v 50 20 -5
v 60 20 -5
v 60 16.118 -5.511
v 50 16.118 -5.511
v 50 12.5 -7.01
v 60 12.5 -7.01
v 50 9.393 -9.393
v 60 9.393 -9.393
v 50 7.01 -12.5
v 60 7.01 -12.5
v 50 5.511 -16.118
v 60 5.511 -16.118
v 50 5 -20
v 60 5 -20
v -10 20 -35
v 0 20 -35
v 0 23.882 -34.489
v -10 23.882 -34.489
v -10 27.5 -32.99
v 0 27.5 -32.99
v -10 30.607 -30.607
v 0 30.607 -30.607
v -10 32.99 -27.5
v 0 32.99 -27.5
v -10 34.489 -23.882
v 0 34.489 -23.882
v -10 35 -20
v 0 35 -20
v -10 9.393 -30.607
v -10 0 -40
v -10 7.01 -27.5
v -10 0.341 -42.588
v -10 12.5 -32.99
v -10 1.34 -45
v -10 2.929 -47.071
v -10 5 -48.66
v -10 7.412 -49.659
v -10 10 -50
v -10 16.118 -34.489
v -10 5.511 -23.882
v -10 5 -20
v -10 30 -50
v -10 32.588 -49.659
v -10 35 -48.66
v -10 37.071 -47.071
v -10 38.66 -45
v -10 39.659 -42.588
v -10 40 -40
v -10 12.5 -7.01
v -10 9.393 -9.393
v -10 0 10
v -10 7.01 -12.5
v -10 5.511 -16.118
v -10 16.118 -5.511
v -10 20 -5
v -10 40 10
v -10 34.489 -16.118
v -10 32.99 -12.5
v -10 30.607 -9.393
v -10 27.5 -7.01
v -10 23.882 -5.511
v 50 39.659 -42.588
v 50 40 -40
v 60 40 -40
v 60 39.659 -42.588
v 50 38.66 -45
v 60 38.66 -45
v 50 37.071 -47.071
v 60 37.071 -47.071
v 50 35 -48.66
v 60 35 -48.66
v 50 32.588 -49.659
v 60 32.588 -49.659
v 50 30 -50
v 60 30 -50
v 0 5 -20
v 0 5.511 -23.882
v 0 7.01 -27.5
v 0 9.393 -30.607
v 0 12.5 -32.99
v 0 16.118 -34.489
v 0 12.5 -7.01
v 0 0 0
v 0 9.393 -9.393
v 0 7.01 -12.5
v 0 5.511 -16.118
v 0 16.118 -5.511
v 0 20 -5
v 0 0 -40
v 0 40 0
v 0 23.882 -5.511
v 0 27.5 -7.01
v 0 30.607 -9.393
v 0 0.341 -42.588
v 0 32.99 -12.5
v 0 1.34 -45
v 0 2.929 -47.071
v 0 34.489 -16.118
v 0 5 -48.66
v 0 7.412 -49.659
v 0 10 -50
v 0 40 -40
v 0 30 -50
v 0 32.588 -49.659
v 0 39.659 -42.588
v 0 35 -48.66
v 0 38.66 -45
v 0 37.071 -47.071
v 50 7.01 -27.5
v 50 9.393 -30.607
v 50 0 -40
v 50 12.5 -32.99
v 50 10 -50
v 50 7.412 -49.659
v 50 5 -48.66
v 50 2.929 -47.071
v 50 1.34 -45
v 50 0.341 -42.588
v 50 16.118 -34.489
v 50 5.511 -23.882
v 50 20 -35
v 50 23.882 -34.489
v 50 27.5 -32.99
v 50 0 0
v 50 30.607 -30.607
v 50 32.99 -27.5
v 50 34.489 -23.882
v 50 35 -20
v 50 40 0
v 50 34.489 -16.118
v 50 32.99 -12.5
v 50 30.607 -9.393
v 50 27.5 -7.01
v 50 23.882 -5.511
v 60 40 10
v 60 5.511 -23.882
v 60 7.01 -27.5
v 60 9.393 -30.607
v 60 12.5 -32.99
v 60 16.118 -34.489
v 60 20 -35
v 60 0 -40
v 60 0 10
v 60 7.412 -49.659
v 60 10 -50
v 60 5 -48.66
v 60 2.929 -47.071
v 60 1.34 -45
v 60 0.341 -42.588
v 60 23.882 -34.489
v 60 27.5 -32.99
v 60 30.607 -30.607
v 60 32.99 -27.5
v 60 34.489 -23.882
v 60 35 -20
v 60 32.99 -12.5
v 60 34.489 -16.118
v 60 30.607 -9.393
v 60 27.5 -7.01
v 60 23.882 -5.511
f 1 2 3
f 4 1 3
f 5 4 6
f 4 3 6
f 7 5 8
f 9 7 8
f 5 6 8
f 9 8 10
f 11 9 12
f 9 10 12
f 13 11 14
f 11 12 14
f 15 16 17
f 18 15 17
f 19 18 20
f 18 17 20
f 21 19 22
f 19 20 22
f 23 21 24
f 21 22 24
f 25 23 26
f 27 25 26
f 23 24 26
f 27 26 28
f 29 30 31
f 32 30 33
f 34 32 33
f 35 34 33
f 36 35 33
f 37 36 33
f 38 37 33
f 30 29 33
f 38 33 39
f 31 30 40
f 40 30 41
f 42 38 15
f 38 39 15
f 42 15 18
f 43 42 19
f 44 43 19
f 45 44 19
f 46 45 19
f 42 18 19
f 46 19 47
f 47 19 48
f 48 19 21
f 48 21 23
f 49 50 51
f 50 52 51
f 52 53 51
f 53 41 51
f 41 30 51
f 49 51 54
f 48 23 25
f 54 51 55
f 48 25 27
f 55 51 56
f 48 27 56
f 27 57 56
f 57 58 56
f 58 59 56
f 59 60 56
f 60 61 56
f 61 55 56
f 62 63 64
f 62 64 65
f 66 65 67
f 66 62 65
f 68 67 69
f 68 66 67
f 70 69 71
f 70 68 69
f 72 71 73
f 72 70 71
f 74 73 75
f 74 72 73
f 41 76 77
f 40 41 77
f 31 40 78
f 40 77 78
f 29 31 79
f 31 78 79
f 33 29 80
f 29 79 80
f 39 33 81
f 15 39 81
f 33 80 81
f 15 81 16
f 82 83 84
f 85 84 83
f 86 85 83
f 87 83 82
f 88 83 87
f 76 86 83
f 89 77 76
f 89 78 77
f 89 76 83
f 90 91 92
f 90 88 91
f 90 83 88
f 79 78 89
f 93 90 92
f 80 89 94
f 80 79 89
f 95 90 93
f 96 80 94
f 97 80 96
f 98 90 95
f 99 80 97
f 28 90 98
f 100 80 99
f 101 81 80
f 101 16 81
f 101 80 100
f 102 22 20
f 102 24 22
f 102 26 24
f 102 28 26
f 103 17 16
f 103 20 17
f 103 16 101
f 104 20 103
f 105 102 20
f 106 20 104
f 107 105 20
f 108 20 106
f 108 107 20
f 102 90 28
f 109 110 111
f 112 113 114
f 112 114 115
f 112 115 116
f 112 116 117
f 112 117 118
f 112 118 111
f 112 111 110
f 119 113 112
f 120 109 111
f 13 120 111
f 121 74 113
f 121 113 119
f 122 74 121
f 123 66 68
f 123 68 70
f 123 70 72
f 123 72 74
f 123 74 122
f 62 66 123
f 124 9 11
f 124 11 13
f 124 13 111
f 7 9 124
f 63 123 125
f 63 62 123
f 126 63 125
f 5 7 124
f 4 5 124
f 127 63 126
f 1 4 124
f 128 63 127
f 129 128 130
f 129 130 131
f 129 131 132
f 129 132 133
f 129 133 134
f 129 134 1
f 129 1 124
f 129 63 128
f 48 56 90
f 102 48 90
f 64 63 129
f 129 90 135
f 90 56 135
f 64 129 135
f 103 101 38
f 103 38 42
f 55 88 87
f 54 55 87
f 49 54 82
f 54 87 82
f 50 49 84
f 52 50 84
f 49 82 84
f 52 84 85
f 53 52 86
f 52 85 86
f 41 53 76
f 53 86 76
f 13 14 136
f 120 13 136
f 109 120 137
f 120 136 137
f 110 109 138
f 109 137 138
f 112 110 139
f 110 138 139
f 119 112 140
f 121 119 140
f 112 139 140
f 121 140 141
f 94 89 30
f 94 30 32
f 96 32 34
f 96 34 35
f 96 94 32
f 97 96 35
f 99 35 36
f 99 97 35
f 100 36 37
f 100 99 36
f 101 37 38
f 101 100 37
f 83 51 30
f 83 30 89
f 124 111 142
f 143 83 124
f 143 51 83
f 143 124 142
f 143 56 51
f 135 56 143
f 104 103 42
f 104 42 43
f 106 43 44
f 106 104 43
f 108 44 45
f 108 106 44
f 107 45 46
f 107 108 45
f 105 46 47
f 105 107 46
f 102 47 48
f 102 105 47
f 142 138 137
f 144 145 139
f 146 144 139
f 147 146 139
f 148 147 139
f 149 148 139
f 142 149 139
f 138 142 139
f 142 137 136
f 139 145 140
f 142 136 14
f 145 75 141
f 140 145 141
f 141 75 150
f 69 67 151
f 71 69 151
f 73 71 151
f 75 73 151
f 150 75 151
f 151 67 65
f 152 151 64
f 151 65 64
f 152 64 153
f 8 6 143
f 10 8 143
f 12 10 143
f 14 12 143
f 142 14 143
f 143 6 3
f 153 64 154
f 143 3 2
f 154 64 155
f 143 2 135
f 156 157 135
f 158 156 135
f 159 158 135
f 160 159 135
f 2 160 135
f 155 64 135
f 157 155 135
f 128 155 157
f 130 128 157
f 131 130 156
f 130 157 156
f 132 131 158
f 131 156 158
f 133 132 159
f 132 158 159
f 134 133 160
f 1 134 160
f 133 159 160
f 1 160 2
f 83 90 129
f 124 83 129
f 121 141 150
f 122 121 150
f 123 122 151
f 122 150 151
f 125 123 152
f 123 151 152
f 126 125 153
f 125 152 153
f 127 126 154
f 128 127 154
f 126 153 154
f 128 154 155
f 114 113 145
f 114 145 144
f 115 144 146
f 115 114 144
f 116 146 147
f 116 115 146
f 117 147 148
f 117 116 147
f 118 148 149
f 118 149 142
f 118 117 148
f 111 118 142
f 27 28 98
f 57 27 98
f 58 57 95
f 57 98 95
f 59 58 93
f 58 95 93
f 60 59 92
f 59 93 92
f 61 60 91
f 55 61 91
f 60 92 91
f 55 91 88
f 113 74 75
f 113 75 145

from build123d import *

# Parameters (mm, degrees)
SKETCH1_W           = 50
SKETCH1_H           = 40
BOSS_EXTRUDE1_DEPTH = 10
BOSS_EXTRUDE2_DEPTH = 10
BOSS_EXTRUDE3_DEPTH = 10
SKETCH4_W           = 70
SKETCH4_H           = 40
BOSS_EXTRUDE4_DEPTH = 10
CUT_EXTRUDE1_DEPTH  = 140


with BuildPart() as part:
    # Sketch1 → Boss-Extrude1 (new body)
    with BuildSketch(Plane.XY):
        with Locations((25, 20)):
            Rectangle(SKETCH1_W, SKETCH1_H)
    extrude(amount=BOSS_EXTRUDE1_DEPTH)

    # Sketch3 → Boss-Extrude3 (add)
    with BuildSketch(Plane(origin=(50, 0, 0), x_dir=(0, 0, -1), z_dir=(1, 0, 0))):
        with BuildLine():
            Line((-10, 40), (40, 40))
            ThreePointArc((40, 40), (47.071067812, 37.071067812), (50, 30))
            Line((50, 30), (50, 10))
            ThreePointArc((50, 10), (47.071067812, 2.928932188), (40, 0))
            Line((40, 0), (-10, 0))
            Line((-10, 0), (-10, 40))
        make_face()
    extrude(amount=BOSS_EXTRUDE3_DEPTH)



with BuildPart() as body_2:
    # Sketch2 → Boss-Extrude2 (new body)
    with BuildSketch(Plane(origin=(0, 0, 0), x_dir=(0, 0, -1), z_dir=(1, 0, 0))):
        with BuildLine():
            Line((0, 0), (40, 0))
            ThreePointArc((40, 0), (47.071067812, 2.928932188), (50, 10))
            Line((50, 10), (50, 30))
            ThreePointArc((50, 30), (47.071067812, 37.071067812), (40, 40))
            Line((40, 40), (0, 40))
            Line((0, 40), (0, 0))
        make_face()
    extrude(amount=-BOSS_EXTRUDE2_DEPTH)


with BuildPart() as part_1:
    add(part.part)

    add(body_2.part)  # Boss-Extrude4 merges body 2
    # Sketch4 → Boss-Extrude4 (add)
    with BuildSketch(Plane.XY.offset(10)):
        with Locations((25, 20)):
            Rectangle(SKETCH4_W, SKETCH4_H)
    extrude(amount=-BOSS_EXTRUDE4_DEPTH)

    # Sketch5 → Cut-Extrude1 (cut)
    with BuildSketch(Plane(origin=(60, 0, 0), x_dir=(0, 0, -1), z_dir=(1, 0, 0))):
        with BuildLine():
            Line((20, 20), (35, 20))
            ThreePointArc((35, 20), (30.606601718, 30.606601718), (20, 35))
            Line((20, 35), (20, 20))
        make_face()
        with BuildLine():
            Line((5, 20), (20, 20))
            Line((20, 20), (20, 35))
            ThreePointArc((20, 35), (9.393398282, 30.606601718), (5, 20))
        make_face()
        with BuildLine():
            ThreePointArc((20, 5), (30.606601718, 9.393398282), (35, 20))
            Line((35, 20), (20, 20))
            Line((20, 20), (20, 5))
        make_face()
        with BuildLine():
            Line((20, 5), (20, 20))
            Line((20, 20), (5, 20))
            ThreePointArc((5, 20), (9.393398282, 9.393398282), (20, 5))
        make_face()
    extrude(amount=-CUT_EXTRUDE1_DEPTH, mode=Mode.SUBTRACT)


solid = part_1.part
